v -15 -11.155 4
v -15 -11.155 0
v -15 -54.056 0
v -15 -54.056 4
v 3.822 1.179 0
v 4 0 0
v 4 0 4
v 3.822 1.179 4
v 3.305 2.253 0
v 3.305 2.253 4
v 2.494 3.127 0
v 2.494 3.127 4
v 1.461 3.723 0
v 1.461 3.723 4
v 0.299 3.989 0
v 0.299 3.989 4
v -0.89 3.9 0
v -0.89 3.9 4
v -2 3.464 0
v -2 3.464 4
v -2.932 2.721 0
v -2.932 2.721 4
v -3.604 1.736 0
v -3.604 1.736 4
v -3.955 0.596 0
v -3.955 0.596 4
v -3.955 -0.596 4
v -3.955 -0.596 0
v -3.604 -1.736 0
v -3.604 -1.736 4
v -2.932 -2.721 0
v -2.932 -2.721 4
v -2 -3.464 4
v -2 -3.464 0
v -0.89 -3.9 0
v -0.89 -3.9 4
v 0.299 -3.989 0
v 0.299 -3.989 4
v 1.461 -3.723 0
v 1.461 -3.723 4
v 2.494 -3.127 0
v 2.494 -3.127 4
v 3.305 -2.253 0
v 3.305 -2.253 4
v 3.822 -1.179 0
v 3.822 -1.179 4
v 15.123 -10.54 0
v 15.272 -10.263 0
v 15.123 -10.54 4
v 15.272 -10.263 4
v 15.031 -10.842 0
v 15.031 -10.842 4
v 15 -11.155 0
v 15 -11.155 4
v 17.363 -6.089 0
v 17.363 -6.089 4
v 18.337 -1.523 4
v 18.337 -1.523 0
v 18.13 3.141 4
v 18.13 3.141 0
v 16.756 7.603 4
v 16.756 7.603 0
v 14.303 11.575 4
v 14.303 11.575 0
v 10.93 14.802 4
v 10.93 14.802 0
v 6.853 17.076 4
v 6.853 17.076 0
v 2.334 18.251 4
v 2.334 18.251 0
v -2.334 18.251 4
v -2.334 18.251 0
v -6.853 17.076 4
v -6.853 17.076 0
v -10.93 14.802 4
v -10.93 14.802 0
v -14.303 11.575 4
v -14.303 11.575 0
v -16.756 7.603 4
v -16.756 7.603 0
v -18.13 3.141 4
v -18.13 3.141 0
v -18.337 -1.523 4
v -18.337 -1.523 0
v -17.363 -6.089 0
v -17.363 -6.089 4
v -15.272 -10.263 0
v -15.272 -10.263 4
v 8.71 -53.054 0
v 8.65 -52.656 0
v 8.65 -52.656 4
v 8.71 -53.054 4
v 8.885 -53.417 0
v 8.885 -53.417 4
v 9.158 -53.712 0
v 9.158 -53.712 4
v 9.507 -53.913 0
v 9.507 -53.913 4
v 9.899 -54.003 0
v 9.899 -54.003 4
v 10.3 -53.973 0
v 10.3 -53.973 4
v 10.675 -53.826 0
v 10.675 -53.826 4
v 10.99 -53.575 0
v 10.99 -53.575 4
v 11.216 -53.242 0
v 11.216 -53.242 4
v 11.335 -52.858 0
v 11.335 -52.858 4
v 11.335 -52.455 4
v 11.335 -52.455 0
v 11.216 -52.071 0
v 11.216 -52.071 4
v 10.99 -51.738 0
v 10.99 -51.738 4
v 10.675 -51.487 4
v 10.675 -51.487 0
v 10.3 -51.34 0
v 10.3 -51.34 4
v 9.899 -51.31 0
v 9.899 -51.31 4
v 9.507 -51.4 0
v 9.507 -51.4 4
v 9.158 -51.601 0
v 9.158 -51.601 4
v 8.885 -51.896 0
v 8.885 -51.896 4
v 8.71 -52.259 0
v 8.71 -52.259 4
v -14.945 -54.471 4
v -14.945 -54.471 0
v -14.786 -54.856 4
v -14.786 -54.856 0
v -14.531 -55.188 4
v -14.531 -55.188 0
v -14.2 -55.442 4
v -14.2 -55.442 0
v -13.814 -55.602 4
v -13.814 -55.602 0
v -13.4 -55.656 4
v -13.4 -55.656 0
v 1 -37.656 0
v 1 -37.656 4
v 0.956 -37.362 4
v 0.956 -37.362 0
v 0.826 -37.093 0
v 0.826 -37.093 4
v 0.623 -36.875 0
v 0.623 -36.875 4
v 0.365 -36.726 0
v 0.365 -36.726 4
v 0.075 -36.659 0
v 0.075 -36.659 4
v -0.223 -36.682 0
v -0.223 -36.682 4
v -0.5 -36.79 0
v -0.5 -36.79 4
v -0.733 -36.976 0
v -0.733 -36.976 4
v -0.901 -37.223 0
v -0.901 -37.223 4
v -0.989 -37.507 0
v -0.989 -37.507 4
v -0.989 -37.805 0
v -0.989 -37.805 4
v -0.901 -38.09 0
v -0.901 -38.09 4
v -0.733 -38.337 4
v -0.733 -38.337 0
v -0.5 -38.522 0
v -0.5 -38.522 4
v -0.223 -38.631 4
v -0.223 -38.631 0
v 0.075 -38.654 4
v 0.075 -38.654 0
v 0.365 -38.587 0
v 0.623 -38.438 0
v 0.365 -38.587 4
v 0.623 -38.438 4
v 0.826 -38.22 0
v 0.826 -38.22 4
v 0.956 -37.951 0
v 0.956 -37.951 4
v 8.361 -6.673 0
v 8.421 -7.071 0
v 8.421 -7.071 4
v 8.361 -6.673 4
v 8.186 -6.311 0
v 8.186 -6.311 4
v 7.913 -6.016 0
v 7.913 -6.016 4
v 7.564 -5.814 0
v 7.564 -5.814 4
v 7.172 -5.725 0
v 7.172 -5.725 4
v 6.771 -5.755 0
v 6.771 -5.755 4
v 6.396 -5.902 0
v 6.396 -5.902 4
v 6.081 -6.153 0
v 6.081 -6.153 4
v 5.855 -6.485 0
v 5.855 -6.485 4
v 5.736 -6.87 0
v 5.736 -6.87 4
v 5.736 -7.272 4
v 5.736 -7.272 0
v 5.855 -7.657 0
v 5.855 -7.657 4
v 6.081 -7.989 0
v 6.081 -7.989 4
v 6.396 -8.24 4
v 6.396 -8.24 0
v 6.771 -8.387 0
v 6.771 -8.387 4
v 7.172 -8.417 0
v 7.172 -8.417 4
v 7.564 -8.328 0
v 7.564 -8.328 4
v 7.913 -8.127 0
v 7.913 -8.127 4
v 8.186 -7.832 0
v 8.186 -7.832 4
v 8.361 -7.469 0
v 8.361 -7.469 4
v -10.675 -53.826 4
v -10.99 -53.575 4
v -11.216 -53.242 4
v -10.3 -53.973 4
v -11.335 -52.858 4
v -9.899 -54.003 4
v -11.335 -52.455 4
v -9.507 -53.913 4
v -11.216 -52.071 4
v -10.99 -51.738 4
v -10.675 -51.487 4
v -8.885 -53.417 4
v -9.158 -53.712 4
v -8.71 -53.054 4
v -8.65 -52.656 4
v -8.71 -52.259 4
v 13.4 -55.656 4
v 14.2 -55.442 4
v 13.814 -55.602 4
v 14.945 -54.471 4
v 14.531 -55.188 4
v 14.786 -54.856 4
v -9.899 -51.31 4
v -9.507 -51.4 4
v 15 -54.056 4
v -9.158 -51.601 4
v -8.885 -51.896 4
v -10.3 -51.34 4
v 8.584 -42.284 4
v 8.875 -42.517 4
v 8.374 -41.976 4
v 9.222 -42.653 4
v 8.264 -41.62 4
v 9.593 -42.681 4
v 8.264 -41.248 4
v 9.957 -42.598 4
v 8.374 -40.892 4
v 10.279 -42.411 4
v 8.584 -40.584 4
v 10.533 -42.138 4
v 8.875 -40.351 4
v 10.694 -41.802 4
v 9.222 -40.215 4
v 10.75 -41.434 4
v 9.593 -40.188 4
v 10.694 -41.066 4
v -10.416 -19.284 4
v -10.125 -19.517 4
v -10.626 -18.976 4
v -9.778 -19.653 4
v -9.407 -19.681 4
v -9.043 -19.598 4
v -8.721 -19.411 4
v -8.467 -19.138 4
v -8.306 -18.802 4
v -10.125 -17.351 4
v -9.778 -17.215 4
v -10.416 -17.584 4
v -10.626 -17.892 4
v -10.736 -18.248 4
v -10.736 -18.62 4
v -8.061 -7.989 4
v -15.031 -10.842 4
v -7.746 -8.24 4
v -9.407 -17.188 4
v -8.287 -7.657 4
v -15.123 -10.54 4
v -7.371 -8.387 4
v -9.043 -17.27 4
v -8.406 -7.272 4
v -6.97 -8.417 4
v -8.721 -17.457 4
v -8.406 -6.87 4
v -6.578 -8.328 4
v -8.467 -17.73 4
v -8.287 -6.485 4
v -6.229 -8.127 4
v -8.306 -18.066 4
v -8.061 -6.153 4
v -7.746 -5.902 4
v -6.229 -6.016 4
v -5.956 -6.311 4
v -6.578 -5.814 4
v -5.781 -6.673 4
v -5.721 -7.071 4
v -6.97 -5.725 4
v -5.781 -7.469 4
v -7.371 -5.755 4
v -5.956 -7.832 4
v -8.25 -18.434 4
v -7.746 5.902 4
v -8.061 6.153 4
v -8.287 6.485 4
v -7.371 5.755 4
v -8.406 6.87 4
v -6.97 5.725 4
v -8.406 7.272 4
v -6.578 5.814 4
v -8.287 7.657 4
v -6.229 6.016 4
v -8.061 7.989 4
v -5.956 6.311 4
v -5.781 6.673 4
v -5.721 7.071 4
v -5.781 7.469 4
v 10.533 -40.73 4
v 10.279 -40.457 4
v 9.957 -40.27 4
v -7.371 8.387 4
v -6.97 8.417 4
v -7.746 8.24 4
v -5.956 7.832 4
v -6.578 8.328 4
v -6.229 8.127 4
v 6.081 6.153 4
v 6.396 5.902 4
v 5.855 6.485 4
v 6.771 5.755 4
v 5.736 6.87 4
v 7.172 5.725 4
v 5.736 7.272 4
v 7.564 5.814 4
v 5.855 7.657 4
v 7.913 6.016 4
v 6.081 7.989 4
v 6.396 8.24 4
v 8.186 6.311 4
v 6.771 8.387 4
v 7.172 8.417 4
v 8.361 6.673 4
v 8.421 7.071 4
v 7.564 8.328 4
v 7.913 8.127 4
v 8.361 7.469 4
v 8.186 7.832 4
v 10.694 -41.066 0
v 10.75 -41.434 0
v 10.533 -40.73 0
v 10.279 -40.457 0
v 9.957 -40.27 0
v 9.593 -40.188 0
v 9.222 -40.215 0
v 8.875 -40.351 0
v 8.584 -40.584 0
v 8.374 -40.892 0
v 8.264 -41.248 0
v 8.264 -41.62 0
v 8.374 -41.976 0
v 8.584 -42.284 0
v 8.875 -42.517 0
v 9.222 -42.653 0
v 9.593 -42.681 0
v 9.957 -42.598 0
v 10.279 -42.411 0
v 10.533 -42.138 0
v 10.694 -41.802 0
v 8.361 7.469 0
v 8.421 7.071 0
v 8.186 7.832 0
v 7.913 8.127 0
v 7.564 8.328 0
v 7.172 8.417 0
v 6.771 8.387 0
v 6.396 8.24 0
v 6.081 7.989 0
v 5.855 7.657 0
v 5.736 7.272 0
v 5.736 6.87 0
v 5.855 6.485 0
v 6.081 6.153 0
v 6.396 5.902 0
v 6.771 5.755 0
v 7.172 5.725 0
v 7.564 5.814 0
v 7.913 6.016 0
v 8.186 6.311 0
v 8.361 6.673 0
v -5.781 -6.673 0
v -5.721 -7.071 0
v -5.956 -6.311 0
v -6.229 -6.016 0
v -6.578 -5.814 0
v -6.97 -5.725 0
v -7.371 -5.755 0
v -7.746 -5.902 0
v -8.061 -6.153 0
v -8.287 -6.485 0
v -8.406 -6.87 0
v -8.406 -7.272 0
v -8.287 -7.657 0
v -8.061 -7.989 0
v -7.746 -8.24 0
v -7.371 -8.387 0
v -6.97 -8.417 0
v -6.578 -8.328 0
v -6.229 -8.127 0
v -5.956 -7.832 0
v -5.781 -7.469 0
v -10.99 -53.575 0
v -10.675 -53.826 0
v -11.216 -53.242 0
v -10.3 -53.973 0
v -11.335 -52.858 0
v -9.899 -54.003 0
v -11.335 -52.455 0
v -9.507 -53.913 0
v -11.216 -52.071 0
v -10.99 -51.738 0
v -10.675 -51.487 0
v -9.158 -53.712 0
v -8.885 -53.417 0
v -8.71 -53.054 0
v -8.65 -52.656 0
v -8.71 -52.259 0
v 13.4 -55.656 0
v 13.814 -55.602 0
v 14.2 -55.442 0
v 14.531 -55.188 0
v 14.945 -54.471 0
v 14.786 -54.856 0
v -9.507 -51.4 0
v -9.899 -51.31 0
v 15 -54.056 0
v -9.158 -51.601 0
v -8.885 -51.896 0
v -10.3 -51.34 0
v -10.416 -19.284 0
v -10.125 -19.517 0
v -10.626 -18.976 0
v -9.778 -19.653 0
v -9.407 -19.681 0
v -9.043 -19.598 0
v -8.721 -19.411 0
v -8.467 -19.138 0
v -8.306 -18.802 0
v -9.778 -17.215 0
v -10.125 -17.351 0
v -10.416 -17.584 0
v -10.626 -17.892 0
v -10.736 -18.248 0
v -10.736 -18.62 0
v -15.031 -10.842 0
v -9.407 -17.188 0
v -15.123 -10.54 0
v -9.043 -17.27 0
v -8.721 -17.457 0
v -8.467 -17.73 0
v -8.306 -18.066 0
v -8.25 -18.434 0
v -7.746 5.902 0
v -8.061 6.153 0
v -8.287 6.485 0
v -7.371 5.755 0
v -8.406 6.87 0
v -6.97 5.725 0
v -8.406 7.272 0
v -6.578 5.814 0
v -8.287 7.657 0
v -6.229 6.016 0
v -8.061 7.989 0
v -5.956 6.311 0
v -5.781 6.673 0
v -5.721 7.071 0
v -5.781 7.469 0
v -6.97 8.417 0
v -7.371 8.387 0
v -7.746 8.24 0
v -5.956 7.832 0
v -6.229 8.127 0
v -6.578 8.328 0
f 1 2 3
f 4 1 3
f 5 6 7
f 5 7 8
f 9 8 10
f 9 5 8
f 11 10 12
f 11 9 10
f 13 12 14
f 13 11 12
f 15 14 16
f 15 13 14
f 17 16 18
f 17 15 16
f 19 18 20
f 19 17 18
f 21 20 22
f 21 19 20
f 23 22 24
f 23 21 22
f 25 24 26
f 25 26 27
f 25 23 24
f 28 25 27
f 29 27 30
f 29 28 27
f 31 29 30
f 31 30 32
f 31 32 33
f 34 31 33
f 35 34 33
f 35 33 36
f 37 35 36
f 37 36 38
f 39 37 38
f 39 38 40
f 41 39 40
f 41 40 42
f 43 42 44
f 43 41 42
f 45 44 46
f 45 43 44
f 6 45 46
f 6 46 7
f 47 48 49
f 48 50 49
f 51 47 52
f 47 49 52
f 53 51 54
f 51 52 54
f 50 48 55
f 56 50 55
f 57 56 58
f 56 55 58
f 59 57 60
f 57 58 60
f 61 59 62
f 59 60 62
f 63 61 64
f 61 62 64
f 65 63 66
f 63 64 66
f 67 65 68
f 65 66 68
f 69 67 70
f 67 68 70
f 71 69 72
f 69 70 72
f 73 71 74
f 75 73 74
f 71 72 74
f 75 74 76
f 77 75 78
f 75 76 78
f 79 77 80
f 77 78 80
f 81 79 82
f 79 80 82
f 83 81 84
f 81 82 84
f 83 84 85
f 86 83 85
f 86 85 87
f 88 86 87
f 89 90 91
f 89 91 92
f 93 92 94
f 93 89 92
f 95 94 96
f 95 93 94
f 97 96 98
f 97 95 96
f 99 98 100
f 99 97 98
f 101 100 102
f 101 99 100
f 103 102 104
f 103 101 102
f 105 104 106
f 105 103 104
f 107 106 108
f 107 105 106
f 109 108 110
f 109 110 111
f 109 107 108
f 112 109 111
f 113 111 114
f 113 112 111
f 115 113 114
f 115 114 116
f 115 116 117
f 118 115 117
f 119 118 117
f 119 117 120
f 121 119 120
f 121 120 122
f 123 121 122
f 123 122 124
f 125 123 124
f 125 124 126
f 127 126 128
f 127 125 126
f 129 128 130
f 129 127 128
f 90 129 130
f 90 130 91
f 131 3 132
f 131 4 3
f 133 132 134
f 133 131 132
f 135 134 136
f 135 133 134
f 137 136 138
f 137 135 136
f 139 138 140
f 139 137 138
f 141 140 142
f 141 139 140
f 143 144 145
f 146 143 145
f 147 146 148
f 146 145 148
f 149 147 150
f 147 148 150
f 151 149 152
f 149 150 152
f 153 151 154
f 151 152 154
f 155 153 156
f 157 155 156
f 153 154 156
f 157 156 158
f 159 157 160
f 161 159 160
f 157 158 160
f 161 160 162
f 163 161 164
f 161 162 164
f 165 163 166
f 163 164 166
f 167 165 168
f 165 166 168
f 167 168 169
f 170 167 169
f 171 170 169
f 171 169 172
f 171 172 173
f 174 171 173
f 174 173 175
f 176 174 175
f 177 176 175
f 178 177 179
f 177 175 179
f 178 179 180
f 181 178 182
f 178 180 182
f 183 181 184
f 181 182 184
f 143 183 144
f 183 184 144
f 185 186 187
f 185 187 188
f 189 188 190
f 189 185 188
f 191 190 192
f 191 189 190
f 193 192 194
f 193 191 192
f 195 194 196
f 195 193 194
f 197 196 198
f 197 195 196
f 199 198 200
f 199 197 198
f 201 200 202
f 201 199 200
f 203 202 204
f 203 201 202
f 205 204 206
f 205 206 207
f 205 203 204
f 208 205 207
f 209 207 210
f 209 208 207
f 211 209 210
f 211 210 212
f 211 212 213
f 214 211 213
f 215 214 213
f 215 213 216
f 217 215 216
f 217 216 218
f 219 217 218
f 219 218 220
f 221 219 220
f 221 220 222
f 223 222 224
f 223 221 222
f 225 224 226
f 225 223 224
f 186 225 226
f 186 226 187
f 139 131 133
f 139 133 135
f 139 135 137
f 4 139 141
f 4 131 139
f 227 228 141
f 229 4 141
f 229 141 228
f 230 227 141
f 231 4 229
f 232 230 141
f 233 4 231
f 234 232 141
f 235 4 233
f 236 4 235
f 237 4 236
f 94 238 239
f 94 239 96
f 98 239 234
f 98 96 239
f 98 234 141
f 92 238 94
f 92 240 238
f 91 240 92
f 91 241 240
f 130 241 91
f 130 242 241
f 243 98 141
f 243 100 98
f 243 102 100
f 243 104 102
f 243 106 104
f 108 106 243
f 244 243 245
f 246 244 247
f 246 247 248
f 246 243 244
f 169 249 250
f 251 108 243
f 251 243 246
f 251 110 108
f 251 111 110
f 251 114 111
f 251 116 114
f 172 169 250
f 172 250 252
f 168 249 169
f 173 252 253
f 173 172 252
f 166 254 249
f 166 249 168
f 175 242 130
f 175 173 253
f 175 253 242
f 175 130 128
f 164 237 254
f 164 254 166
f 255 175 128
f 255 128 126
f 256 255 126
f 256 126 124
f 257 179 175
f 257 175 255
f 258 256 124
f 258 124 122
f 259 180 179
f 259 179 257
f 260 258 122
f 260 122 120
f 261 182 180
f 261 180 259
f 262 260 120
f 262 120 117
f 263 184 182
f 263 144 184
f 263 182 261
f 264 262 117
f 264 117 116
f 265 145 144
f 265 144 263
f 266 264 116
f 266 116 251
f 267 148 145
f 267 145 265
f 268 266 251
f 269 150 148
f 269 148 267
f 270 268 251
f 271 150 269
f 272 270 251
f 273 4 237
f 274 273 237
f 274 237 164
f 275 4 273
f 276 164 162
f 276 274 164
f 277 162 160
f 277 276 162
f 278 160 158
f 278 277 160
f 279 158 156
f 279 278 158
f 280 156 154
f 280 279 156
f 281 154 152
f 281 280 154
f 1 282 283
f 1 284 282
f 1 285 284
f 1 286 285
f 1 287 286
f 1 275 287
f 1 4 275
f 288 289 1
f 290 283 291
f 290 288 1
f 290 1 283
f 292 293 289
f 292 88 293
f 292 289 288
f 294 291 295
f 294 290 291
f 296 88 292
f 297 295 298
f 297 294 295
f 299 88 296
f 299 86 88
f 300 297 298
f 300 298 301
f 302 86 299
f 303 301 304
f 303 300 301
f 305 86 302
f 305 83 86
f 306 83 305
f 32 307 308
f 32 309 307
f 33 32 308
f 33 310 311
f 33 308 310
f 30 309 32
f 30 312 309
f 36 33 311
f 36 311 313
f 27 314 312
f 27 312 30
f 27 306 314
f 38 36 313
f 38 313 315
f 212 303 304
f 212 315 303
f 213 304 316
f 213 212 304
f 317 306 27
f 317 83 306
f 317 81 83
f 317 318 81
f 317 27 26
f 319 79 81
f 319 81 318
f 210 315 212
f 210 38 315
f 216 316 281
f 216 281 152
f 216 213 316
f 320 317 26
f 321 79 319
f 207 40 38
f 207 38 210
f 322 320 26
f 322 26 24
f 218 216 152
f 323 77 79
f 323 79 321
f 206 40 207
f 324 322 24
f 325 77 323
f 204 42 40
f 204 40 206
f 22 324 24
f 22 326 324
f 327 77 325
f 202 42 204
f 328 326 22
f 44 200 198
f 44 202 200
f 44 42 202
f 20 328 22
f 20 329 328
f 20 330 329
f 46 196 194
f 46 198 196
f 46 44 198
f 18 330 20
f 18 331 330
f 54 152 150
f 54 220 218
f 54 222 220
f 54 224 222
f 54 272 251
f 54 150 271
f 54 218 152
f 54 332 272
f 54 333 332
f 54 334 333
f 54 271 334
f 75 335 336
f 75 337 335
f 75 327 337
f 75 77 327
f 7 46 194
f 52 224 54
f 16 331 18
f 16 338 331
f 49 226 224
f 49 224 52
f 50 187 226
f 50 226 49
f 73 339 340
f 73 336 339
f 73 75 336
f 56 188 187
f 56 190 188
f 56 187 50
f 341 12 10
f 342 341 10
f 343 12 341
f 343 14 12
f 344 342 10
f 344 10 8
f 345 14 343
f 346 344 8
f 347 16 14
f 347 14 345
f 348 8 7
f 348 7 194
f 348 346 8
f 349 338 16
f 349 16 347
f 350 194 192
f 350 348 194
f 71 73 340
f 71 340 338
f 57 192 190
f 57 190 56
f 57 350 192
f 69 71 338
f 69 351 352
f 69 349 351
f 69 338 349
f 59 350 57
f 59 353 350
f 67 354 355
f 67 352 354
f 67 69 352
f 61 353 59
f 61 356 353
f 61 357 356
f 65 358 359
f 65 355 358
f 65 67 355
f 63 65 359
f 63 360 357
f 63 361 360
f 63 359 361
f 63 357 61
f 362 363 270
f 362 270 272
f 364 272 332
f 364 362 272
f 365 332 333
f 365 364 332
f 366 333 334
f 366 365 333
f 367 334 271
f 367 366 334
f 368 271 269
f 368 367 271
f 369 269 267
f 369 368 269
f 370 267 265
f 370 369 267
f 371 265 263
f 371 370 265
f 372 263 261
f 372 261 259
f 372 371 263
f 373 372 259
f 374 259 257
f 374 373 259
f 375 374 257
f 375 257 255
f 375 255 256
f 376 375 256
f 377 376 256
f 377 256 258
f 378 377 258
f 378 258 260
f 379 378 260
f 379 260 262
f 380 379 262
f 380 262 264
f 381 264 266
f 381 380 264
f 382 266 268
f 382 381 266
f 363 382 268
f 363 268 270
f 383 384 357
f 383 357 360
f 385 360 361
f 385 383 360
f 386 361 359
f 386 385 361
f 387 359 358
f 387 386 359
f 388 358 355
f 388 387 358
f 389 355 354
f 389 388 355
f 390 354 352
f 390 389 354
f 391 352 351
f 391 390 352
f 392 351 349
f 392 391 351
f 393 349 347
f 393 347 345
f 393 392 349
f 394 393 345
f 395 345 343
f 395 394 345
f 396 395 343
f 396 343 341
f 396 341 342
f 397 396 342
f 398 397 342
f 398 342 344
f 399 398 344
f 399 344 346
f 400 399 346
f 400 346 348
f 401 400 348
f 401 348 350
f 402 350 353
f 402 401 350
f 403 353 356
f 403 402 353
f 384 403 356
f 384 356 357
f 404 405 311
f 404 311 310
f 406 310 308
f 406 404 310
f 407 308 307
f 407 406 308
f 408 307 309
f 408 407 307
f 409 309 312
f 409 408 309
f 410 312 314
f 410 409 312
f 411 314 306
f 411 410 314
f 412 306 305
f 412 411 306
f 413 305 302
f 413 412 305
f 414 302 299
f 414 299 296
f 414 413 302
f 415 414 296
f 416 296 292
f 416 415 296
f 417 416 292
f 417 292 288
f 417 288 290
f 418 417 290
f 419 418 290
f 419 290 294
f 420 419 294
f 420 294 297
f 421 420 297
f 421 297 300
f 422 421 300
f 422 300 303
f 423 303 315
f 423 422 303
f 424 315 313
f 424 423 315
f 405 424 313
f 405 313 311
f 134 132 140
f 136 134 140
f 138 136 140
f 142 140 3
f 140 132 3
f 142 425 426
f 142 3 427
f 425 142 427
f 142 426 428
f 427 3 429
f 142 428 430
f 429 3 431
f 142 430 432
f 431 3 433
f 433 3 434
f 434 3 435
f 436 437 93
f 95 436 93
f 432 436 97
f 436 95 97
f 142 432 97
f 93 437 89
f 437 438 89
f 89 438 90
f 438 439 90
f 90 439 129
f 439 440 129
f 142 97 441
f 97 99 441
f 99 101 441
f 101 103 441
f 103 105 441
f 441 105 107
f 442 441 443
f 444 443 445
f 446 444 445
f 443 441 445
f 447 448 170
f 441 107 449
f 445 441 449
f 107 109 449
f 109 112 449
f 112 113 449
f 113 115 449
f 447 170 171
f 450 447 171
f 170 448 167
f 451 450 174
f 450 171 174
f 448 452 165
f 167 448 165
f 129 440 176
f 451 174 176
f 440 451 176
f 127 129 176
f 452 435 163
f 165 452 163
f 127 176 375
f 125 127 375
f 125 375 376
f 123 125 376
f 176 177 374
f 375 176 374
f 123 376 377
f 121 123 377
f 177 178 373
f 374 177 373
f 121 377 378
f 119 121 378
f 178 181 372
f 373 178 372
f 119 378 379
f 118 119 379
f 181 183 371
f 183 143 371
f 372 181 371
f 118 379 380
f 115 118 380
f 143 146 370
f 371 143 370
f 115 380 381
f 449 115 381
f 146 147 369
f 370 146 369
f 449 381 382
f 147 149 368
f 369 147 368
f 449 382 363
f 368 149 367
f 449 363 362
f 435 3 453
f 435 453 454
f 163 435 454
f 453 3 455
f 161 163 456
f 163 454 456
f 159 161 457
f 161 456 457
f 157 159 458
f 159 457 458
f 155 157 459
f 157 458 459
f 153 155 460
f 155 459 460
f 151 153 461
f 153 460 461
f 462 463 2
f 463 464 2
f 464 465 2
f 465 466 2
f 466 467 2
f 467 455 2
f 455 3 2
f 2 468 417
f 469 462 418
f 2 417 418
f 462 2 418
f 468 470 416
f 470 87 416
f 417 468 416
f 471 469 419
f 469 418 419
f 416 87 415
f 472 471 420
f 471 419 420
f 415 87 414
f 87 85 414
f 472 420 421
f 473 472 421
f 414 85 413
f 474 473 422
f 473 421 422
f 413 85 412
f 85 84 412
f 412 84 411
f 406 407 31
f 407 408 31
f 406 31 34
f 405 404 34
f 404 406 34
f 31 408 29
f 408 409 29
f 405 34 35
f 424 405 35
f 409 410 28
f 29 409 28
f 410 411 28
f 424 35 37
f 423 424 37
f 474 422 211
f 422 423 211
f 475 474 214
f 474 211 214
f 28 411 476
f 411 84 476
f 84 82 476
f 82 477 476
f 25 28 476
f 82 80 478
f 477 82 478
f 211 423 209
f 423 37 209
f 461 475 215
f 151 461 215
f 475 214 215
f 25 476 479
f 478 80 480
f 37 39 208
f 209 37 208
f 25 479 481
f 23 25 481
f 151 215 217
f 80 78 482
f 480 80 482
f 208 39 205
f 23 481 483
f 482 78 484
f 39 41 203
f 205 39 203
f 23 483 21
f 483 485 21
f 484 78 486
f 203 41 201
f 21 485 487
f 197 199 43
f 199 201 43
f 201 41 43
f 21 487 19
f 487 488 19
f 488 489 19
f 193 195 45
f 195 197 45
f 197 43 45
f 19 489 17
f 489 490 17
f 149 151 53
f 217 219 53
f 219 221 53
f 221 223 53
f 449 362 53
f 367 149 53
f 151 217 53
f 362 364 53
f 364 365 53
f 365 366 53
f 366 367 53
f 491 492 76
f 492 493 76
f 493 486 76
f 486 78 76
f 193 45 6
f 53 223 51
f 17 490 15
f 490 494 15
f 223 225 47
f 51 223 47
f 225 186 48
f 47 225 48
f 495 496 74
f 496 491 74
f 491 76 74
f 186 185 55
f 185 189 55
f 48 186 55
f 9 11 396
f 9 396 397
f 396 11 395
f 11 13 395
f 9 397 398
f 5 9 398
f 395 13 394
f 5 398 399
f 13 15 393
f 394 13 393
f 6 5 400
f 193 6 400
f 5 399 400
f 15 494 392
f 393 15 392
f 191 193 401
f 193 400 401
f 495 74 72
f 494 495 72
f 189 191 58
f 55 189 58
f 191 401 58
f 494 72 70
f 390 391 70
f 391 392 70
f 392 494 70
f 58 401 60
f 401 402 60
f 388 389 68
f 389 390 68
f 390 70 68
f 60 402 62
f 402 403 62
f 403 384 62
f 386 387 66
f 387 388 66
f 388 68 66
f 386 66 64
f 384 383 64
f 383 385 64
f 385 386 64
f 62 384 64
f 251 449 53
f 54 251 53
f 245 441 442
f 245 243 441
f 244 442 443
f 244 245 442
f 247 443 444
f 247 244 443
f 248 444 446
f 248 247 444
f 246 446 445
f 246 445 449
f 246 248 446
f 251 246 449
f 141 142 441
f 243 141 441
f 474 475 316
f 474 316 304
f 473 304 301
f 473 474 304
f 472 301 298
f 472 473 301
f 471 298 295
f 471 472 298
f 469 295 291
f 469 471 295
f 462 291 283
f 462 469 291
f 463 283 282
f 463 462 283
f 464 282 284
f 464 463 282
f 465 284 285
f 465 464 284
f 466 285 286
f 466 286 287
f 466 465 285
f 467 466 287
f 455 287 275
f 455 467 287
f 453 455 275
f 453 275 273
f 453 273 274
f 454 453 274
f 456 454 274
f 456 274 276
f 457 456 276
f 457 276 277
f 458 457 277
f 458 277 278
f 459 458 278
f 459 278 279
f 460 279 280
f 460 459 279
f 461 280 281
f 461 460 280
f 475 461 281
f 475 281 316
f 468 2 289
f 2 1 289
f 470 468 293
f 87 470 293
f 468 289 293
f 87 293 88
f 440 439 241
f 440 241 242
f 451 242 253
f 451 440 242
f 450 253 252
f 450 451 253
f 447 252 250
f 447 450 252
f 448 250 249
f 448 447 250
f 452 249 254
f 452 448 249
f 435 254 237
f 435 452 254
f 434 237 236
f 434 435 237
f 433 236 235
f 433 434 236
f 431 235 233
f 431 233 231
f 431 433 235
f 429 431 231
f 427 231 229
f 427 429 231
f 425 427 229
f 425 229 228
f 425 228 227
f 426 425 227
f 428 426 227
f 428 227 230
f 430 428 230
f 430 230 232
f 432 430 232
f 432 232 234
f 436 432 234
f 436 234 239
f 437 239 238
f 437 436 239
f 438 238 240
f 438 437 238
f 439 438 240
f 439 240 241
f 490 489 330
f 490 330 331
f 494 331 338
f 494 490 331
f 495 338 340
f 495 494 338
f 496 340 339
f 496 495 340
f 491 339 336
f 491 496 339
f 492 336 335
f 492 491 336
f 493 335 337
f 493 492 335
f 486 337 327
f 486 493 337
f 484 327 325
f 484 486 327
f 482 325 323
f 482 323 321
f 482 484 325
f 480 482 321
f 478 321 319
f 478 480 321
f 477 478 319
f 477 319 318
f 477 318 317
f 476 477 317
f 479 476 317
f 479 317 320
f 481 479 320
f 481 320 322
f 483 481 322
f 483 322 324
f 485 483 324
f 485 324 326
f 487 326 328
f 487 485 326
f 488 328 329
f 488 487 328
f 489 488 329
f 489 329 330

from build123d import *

# Parameters (mm, degrees)
CROQUIS1_R              = 1.35
CROQUIS1_R_2            = 4
CROQUIS1_R_3            = 1.25
SALIENTE_EXTRUIR1_DEPTH = 4
REDONDEO1_R             = 1.6
CROQUIS2_R              = 1
CORTAR_EXTRUIR1_DEPTH   = 4


with BuildPart() as part:
    # Croquis1 → Saliente-Extruir1 (new body)
    with BuildSketch(Plane.XY):
        with BuildLine():
            Line((-15, -10.656453444), (-15, -55.656453444))
            Line((-15, -55.656453444), (15, -55.656453444))
            Line((15, -55.656453444), (15, -10.656453444))
            ThreePointArc((15, -10.656453444), (0, 18.4), (-15, -10.656453444))
        make_face()
        with Locations((-7.071067812, -7.071067812)):
            Circle(CROQUIS1_R, mode=Mode.SUBTRACT)
        with Locations((-7.071067812, 7.071067812)):
            Circle(CROQUIS1_R, mode=Mode.SUBTRACT)
        with Locations((7.071067812, 7.071067812)):
            Circle(CROQUIS1_R, mode=Mode.SUBTRACT)
        with Locations((7.071067812, -7.071067812)):
            Circle(CROQUIS1_R, mode=Mode.SUBTRACT)
        Circle(CROQUIS1_R_2, mode=Mode.SUBTRACT)
        with Locations((-10, -52.656453444)):
            Circle(CROQUIS1_R, mode=Mode.SUBTRACT)
        with Locations(Location((10, -52.656453444, 0), (0, 0, 180))):
            Circle(CROQUIS1_R, mode=Mode.SUBTRACT)
        with Locations((9.5, -41.434010022)):
            Circle(CROQUIS1_R_3, mode=Mode.SUBTRACT)
        with Locations((-9.5, -18.434010022)):
            Circle(CROQUIS1_R_3, mode=Mode.SUBTRACT)
    extrude(amount=SALIENTE_EXTRUIR1_DEPTH)

    # Redondeo1
    redondeo1_edges = [part.edges().sort_by_distance(p)[0] for p in [
        (15, -10.656453444, 2),
        (15, -55.656453444, 2),
        (-15, -55.656453444, 2),
        (-15, -10.656453444, 2),
    ]]
    fillet(redondeo1_edges, radius=REDONDEO1_R)

    # Croquis2 → Cortar-Extruir1 (cut)
    with BuildSketch(Plane.XY.offset(4)):
        with Locations((0, -37.656453444)):
            Circle(CROQUIS2_R)
    extrude(amount=-CORTAR_EXTRUIR1_DEPTH, mode=Mode.SUBTRACT)


solid = part.part
